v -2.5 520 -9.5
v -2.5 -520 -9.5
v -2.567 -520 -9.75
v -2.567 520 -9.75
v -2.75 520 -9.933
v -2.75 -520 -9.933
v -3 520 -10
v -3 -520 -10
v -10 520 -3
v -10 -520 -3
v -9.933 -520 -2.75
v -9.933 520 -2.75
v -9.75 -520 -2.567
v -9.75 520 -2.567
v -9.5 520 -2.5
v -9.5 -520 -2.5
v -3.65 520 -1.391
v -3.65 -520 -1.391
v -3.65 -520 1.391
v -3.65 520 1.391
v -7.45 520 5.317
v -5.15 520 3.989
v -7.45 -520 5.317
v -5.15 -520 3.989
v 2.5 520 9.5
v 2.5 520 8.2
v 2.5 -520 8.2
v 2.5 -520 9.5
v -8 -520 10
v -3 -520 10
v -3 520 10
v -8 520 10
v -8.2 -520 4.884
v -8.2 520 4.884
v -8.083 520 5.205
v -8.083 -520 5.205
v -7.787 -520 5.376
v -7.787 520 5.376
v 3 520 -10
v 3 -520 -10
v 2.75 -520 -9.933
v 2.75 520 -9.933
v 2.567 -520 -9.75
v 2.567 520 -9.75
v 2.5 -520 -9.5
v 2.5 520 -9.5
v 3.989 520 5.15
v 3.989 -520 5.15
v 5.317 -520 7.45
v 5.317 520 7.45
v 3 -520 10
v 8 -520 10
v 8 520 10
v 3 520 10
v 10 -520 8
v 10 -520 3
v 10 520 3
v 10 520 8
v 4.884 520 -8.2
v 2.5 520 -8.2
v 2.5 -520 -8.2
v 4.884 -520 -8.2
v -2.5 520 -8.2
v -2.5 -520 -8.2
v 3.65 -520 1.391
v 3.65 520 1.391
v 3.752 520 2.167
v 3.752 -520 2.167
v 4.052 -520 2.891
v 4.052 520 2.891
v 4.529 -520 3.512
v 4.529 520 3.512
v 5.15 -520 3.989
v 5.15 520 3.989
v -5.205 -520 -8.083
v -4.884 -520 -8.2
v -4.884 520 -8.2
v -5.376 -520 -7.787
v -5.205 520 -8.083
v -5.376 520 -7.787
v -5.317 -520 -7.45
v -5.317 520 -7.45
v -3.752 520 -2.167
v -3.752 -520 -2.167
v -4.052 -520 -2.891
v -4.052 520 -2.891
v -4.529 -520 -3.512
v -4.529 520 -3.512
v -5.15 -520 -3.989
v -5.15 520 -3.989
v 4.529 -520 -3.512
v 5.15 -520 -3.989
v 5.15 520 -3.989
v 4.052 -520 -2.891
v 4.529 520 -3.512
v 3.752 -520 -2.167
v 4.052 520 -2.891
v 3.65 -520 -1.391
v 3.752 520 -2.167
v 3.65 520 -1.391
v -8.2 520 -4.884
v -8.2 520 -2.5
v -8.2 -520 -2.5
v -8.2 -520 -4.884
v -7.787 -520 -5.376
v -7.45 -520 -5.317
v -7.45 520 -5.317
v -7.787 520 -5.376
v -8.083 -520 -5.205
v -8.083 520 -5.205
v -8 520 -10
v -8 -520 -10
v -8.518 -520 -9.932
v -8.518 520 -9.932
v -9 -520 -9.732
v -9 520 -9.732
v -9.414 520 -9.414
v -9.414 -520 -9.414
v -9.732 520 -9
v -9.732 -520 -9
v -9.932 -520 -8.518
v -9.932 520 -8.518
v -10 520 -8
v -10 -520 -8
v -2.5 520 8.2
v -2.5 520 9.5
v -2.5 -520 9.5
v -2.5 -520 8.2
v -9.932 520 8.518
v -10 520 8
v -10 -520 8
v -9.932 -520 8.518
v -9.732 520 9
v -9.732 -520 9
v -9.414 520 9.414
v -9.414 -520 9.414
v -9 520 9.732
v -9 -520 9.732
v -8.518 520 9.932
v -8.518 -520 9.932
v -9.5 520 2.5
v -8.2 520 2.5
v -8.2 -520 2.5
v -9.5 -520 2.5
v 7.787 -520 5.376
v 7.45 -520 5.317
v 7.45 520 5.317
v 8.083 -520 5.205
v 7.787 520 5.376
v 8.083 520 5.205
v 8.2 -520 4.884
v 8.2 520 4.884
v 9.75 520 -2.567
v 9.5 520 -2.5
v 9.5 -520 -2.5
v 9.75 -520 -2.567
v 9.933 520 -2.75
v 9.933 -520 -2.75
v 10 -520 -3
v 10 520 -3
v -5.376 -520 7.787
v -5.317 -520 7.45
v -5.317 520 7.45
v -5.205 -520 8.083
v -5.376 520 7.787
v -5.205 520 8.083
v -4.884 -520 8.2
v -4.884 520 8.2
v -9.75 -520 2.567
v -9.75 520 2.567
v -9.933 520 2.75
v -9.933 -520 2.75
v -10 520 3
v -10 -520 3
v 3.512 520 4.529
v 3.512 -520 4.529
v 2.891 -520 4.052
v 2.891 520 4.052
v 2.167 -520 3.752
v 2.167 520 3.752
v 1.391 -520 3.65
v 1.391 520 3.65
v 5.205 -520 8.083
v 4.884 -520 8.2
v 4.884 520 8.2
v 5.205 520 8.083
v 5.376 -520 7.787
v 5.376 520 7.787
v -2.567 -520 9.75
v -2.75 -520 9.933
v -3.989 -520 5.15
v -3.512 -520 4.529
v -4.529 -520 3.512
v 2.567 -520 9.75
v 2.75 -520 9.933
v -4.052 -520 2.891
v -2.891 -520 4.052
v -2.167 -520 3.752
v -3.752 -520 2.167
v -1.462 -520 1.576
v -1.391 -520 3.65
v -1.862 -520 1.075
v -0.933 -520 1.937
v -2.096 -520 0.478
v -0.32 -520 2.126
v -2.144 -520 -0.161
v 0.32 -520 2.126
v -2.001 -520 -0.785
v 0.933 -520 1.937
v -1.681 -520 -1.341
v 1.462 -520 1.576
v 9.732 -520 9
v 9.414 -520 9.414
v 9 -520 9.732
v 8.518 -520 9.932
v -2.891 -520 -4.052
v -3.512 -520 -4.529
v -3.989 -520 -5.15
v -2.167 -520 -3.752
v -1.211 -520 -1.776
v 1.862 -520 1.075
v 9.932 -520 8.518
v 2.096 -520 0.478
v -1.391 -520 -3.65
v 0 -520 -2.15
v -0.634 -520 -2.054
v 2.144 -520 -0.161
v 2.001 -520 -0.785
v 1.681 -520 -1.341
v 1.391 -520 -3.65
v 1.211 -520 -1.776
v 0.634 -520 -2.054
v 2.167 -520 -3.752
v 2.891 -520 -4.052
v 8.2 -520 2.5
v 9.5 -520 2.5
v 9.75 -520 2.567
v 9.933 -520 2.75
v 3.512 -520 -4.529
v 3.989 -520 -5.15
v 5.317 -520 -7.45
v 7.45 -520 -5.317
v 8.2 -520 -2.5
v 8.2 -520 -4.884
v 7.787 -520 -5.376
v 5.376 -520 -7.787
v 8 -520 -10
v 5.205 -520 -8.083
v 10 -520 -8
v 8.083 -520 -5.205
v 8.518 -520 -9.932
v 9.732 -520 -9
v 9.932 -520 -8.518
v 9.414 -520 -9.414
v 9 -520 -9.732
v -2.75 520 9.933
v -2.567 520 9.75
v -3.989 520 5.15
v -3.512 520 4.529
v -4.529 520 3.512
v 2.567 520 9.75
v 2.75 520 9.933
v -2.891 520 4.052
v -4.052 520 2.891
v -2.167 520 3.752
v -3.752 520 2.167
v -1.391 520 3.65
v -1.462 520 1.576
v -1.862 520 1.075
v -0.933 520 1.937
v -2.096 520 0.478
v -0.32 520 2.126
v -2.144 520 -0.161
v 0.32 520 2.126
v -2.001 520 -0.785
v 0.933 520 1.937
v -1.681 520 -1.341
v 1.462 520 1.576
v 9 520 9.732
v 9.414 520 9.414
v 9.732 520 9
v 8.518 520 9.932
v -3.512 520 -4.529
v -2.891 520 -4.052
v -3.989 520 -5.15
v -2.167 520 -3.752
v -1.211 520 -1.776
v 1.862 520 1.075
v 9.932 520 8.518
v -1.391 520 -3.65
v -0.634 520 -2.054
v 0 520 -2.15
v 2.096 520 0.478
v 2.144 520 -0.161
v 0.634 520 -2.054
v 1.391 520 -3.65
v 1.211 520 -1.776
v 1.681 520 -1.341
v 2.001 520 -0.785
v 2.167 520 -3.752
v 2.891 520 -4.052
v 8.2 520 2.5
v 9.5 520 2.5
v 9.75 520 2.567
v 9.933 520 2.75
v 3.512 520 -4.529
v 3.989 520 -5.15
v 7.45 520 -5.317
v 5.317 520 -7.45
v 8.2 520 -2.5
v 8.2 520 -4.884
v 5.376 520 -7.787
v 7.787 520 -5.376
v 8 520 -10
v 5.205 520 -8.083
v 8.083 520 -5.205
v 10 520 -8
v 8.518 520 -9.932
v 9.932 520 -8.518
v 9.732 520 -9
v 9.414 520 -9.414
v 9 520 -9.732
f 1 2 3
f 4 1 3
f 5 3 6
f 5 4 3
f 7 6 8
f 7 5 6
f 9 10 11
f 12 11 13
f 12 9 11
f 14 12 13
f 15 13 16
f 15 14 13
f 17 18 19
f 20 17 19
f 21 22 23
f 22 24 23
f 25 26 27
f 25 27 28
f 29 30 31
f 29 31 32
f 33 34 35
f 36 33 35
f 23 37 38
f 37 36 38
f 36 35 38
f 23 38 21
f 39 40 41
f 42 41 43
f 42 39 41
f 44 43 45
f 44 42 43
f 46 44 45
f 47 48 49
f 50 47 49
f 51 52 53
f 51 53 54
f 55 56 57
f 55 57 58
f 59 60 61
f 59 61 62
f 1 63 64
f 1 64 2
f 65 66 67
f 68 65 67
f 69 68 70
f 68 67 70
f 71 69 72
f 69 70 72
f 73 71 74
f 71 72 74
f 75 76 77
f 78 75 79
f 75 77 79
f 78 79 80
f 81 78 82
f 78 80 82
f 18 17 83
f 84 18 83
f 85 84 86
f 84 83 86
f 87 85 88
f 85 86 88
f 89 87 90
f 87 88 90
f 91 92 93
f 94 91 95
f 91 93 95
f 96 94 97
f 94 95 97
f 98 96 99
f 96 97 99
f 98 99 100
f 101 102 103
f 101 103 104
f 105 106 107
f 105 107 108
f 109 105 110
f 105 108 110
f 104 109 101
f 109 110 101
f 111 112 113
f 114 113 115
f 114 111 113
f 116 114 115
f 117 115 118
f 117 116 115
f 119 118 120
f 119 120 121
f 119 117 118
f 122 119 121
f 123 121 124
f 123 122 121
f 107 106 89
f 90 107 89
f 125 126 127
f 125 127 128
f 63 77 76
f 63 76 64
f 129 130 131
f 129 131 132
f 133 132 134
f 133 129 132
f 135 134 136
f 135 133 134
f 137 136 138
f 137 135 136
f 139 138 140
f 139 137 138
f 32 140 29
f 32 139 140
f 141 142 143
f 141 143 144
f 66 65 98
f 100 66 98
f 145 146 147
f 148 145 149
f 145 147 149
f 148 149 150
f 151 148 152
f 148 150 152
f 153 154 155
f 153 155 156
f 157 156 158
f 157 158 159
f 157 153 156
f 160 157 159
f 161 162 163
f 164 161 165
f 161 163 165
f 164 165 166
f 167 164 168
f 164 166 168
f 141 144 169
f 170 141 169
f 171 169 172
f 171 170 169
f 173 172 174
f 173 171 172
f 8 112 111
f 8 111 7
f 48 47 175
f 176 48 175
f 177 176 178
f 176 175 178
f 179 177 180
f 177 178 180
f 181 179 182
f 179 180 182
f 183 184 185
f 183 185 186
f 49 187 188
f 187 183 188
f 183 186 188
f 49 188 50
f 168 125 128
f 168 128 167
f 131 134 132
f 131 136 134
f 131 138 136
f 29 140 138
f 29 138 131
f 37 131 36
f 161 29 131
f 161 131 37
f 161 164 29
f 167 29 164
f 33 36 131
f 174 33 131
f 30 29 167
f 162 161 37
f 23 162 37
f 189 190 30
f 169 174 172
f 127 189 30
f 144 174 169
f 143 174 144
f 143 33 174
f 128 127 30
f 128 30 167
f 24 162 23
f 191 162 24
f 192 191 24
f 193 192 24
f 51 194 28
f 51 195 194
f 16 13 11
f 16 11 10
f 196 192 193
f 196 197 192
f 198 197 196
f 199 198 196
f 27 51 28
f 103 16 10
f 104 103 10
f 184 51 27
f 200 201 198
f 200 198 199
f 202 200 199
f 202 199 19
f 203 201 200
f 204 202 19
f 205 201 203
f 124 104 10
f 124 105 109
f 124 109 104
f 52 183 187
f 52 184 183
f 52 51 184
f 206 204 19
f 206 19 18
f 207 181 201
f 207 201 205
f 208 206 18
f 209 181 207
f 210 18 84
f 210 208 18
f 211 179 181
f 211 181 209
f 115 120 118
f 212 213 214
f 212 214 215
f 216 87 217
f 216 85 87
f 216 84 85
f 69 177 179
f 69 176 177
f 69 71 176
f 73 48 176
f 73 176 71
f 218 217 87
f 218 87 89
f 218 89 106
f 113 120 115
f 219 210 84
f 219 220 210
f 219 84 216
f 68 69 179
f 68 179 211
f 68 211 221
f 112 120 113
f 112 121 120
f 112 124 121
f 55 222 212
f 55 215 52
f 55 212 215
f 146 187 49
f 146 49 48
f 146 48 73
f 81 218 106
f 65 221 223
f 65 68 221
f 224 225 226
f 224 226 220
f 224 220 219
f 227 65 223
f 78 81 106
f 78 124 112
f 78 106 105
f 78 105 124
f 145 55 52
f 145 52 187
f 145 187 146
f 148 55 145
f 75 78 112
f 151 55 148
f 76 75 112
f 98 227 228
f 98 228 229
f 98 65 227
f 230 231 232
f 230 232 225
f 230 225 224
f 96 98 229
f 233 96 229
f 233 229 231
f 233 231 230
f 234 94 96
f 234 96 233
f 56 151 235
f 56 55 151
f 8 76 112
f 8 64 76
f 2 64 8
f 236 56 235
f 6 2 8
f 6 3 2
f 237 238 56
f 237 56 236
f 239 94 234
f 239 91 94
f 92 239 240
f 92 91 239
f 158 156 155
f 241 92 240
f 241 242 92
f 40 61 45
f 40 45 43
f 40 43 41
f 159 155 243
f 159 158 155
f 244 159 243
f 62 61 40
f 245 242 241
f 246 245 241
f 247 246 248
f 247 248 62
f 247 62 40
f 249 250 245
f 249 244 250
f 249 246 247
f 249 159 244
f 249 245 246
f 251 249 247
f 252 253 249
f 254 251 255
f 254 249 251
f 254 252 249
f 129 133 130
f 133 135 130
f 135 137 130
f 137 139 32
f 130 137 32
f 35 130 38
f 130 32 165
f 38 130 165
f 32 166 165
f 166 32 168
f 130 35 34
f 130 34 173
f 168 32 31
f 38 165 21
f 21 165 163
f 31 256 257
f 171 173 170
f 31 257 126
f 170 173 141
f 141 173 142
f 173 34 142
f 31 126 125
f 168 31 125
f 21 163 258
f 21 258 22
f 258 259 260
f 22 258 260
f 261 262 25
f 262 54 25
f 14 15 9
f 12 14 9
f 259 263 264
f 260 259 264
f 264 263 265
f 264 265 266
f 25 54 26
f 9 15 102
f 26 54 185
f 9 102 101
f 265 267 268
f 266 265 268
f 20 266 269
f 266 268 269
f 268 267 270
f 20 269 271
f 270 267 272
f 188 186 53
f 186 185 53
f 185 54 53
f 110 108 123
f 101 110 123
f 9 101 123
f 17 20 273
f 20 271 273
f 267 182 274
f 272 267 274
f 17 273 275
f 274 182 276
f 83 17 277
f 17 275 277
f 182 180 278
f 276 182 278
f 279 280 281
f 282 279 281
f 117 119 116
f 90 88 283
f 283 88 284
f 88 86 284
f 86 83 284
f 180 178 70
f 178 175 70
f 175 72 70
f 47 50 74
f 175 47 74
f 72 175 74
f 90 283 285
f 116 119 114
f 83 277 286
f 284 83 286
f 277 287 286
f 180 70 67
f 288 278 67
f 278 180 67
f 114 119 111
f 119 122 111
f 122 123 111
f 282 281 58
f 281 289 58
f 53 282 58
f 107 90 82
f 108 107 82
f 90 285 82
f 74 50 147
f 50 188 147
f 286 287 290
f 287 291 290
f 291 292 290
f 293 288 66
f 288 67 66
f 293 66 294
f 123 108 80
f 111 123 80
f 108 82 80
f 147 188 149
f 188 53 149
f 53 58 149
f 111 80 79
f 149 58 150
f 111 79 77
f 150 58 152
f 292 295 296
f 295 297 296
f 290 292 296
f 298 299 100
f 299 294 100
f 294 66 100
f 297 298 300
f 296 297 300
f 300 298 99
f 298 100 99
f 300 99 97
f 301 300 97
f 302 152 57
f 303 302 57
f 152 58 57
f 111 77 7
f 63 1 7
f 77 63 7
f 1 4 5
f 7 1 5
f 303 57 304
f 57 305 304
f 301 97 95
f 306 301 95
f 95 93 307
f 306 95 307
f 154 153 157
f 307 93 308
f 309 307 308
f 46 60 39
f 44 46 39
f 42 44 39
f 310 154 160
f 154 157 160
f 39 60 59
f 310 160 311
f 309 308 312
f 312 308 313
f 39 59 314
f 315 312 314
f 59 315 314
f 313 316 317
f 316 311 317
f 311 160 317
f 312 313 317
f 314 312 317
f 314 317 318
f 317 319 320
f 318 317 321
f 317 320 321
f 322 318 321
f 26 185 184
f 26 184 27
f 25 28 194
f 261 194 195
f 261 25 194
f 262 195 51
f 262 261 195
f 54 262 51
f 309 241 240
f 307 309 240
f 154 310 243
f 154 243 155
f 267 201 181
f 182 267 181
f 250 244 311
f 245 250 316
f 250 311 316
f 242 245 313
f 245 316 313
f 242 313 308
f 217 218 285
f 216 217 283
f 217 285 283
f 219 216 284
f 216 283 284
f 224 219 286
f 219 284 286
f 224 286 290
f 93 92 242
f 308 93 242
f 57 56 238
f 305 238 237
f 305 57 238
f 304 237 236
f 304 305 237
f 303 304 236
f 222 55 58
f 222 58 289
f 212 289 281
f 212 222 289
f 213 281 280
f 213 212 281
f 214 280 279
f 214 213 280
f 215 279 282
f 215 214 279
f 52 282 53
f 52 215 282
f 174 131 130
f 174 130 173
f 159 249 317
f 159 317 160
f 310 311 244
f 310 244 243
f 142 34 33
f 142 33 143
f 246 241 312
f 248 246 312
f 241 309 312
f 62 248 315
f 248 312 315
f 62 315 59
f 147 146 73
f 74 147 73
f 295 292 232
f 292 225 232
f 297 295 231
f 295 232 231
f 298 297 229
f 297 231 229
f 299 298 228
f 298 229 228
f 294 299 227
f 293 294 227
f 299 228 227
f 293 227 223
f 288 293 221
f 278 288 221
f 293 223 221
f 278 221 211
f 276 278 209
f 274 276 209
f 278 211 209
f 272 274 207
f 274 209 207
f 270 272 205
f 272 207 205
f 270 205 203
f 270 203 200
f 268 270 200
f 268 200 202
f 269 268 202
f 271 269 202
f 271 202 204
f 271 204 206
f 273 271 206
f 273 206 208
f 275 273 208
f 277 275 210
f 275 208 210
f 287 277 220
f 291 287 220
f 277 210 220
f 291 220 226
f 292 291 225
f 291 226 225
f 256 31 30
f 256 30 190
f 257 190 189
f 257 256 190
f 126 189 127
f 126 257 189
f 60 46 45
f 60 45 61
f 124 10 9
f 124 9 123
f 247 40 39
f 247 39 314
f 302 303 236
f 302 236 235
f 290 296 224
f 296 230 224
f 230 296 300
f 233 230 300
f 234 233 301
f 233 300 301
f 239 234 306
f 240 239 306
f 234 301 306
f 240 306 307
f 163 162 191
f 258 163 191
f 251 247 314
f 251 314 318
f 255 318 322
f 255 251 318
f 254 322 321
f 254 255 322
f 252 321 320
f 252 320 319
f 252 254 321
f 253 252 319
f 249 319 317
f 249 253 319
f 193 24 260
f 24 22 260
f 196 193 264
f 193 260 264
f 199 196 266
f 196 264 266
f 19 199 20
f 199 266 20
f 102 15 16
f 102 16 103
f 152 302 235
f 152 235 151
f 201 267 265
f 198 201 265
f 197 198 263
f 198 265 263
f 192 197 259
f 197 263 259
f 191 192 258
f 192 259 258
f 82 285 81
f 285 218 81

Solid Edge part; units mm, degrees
sketch "Sketch1" plane through (0, 0, 0) normal (0, -1, 0) x (1, 0, 0)
  line L0 (-10, -10) -> (10, -10)
  line L1 (10, -10) -> (10, 10)
  line L2 (10, 10) -> (-10, 10)
  line L3 (-10, 10) -> (-10, -10)
  dimension "D1" = 20
  dimension "D2" = 20
extrude "Protrusion1" add sketch "Sketch1" along normal mid plane 1040
sketch "Sketch2" plane through (0, -520, 0) normal (0, -1, 0) x (1, 0, 0)
  line L0 (-2.5, 10) -> (-2.5, 8.2)
  line L1 (-2.5, 8.2) -> (-5.75, 8.2)
  line L2 (-5.75, 8.2) -> (-3.1231, 3.65)
  line L3 (-3.1231, 3.65) -> (3.1231, 3.65)
  line L4 (3.1231, 3.65) -> (5.75, 8.2)
  line L5 (5.75, 8.2) -> (2.5, 8.2)
  line L6 (2.5, 8.2) -> (2.5, 10)
  line L7 (2.5, 10) -> (-2.5, 10)
  dimension "D1" = 11.5
  dimension "D2" = 1.8
  dimension "D3" = 5
  dimension "D4" = 6.35
extrude "Cutout1" cut sketch "Sketch2" against normal through all
fillet "Verrundung_1" radius 2 4 edges at (10, 0, 10) (-10, 0, 10) (10, 0, -10) (-10, 0, -10)
fillet "Verrundung_2" radius 3 2 edges at (-3.1231, 0, 3.65) (3.1231, 0, 3.65)
fillet "Verrundung_3" radius 0.5 4 edges at (-5.75, 0, 8.2) (5.75, 0, 8.2) (-2.5, 0, 10) (2.5, 0, 10)
hole "Bohrung_1" at (0, -520, 0) direction (0, 1, 0) diameter 4.3 end up to next
pattern_circular "Pattern1" count 4 over 360 about axis through (0, -520, 0) along (0, -1, 0) of "Cutout1"
fillet "Round1" radius 3 2 edges at (-3.65, 0, -3.1231) (-3.65, 0, 3.1231)
fillet "Round2" radius 0.5 4 edges at (-8.2, 0, -5.75) (-8.2, 0, 5.75) (-10, 0, -2.5) (-10, 0, 2.5)
fillet "Round3" radius 3 2 edges at (3.1231, 0, -3.65) (-3.1231, 0, -3.65)
fillet "Round4" radius 0.5 4 edges at (5.75, 0, -8.2) (-5.75, 0, -8.2) (2.5, 0, -10) (-2.5, 0, -10)
fillet "Round5" radius 3 2 edges at (3.65, 0, 3.1231) (3.65, 0, -3.1231)
fillet "Round6" radius 0.5 4 edges at (8.2, 0, 5.75) (8.2, 0, -5.75) (10, 0, 2.5) (10, 0, -2.5)
